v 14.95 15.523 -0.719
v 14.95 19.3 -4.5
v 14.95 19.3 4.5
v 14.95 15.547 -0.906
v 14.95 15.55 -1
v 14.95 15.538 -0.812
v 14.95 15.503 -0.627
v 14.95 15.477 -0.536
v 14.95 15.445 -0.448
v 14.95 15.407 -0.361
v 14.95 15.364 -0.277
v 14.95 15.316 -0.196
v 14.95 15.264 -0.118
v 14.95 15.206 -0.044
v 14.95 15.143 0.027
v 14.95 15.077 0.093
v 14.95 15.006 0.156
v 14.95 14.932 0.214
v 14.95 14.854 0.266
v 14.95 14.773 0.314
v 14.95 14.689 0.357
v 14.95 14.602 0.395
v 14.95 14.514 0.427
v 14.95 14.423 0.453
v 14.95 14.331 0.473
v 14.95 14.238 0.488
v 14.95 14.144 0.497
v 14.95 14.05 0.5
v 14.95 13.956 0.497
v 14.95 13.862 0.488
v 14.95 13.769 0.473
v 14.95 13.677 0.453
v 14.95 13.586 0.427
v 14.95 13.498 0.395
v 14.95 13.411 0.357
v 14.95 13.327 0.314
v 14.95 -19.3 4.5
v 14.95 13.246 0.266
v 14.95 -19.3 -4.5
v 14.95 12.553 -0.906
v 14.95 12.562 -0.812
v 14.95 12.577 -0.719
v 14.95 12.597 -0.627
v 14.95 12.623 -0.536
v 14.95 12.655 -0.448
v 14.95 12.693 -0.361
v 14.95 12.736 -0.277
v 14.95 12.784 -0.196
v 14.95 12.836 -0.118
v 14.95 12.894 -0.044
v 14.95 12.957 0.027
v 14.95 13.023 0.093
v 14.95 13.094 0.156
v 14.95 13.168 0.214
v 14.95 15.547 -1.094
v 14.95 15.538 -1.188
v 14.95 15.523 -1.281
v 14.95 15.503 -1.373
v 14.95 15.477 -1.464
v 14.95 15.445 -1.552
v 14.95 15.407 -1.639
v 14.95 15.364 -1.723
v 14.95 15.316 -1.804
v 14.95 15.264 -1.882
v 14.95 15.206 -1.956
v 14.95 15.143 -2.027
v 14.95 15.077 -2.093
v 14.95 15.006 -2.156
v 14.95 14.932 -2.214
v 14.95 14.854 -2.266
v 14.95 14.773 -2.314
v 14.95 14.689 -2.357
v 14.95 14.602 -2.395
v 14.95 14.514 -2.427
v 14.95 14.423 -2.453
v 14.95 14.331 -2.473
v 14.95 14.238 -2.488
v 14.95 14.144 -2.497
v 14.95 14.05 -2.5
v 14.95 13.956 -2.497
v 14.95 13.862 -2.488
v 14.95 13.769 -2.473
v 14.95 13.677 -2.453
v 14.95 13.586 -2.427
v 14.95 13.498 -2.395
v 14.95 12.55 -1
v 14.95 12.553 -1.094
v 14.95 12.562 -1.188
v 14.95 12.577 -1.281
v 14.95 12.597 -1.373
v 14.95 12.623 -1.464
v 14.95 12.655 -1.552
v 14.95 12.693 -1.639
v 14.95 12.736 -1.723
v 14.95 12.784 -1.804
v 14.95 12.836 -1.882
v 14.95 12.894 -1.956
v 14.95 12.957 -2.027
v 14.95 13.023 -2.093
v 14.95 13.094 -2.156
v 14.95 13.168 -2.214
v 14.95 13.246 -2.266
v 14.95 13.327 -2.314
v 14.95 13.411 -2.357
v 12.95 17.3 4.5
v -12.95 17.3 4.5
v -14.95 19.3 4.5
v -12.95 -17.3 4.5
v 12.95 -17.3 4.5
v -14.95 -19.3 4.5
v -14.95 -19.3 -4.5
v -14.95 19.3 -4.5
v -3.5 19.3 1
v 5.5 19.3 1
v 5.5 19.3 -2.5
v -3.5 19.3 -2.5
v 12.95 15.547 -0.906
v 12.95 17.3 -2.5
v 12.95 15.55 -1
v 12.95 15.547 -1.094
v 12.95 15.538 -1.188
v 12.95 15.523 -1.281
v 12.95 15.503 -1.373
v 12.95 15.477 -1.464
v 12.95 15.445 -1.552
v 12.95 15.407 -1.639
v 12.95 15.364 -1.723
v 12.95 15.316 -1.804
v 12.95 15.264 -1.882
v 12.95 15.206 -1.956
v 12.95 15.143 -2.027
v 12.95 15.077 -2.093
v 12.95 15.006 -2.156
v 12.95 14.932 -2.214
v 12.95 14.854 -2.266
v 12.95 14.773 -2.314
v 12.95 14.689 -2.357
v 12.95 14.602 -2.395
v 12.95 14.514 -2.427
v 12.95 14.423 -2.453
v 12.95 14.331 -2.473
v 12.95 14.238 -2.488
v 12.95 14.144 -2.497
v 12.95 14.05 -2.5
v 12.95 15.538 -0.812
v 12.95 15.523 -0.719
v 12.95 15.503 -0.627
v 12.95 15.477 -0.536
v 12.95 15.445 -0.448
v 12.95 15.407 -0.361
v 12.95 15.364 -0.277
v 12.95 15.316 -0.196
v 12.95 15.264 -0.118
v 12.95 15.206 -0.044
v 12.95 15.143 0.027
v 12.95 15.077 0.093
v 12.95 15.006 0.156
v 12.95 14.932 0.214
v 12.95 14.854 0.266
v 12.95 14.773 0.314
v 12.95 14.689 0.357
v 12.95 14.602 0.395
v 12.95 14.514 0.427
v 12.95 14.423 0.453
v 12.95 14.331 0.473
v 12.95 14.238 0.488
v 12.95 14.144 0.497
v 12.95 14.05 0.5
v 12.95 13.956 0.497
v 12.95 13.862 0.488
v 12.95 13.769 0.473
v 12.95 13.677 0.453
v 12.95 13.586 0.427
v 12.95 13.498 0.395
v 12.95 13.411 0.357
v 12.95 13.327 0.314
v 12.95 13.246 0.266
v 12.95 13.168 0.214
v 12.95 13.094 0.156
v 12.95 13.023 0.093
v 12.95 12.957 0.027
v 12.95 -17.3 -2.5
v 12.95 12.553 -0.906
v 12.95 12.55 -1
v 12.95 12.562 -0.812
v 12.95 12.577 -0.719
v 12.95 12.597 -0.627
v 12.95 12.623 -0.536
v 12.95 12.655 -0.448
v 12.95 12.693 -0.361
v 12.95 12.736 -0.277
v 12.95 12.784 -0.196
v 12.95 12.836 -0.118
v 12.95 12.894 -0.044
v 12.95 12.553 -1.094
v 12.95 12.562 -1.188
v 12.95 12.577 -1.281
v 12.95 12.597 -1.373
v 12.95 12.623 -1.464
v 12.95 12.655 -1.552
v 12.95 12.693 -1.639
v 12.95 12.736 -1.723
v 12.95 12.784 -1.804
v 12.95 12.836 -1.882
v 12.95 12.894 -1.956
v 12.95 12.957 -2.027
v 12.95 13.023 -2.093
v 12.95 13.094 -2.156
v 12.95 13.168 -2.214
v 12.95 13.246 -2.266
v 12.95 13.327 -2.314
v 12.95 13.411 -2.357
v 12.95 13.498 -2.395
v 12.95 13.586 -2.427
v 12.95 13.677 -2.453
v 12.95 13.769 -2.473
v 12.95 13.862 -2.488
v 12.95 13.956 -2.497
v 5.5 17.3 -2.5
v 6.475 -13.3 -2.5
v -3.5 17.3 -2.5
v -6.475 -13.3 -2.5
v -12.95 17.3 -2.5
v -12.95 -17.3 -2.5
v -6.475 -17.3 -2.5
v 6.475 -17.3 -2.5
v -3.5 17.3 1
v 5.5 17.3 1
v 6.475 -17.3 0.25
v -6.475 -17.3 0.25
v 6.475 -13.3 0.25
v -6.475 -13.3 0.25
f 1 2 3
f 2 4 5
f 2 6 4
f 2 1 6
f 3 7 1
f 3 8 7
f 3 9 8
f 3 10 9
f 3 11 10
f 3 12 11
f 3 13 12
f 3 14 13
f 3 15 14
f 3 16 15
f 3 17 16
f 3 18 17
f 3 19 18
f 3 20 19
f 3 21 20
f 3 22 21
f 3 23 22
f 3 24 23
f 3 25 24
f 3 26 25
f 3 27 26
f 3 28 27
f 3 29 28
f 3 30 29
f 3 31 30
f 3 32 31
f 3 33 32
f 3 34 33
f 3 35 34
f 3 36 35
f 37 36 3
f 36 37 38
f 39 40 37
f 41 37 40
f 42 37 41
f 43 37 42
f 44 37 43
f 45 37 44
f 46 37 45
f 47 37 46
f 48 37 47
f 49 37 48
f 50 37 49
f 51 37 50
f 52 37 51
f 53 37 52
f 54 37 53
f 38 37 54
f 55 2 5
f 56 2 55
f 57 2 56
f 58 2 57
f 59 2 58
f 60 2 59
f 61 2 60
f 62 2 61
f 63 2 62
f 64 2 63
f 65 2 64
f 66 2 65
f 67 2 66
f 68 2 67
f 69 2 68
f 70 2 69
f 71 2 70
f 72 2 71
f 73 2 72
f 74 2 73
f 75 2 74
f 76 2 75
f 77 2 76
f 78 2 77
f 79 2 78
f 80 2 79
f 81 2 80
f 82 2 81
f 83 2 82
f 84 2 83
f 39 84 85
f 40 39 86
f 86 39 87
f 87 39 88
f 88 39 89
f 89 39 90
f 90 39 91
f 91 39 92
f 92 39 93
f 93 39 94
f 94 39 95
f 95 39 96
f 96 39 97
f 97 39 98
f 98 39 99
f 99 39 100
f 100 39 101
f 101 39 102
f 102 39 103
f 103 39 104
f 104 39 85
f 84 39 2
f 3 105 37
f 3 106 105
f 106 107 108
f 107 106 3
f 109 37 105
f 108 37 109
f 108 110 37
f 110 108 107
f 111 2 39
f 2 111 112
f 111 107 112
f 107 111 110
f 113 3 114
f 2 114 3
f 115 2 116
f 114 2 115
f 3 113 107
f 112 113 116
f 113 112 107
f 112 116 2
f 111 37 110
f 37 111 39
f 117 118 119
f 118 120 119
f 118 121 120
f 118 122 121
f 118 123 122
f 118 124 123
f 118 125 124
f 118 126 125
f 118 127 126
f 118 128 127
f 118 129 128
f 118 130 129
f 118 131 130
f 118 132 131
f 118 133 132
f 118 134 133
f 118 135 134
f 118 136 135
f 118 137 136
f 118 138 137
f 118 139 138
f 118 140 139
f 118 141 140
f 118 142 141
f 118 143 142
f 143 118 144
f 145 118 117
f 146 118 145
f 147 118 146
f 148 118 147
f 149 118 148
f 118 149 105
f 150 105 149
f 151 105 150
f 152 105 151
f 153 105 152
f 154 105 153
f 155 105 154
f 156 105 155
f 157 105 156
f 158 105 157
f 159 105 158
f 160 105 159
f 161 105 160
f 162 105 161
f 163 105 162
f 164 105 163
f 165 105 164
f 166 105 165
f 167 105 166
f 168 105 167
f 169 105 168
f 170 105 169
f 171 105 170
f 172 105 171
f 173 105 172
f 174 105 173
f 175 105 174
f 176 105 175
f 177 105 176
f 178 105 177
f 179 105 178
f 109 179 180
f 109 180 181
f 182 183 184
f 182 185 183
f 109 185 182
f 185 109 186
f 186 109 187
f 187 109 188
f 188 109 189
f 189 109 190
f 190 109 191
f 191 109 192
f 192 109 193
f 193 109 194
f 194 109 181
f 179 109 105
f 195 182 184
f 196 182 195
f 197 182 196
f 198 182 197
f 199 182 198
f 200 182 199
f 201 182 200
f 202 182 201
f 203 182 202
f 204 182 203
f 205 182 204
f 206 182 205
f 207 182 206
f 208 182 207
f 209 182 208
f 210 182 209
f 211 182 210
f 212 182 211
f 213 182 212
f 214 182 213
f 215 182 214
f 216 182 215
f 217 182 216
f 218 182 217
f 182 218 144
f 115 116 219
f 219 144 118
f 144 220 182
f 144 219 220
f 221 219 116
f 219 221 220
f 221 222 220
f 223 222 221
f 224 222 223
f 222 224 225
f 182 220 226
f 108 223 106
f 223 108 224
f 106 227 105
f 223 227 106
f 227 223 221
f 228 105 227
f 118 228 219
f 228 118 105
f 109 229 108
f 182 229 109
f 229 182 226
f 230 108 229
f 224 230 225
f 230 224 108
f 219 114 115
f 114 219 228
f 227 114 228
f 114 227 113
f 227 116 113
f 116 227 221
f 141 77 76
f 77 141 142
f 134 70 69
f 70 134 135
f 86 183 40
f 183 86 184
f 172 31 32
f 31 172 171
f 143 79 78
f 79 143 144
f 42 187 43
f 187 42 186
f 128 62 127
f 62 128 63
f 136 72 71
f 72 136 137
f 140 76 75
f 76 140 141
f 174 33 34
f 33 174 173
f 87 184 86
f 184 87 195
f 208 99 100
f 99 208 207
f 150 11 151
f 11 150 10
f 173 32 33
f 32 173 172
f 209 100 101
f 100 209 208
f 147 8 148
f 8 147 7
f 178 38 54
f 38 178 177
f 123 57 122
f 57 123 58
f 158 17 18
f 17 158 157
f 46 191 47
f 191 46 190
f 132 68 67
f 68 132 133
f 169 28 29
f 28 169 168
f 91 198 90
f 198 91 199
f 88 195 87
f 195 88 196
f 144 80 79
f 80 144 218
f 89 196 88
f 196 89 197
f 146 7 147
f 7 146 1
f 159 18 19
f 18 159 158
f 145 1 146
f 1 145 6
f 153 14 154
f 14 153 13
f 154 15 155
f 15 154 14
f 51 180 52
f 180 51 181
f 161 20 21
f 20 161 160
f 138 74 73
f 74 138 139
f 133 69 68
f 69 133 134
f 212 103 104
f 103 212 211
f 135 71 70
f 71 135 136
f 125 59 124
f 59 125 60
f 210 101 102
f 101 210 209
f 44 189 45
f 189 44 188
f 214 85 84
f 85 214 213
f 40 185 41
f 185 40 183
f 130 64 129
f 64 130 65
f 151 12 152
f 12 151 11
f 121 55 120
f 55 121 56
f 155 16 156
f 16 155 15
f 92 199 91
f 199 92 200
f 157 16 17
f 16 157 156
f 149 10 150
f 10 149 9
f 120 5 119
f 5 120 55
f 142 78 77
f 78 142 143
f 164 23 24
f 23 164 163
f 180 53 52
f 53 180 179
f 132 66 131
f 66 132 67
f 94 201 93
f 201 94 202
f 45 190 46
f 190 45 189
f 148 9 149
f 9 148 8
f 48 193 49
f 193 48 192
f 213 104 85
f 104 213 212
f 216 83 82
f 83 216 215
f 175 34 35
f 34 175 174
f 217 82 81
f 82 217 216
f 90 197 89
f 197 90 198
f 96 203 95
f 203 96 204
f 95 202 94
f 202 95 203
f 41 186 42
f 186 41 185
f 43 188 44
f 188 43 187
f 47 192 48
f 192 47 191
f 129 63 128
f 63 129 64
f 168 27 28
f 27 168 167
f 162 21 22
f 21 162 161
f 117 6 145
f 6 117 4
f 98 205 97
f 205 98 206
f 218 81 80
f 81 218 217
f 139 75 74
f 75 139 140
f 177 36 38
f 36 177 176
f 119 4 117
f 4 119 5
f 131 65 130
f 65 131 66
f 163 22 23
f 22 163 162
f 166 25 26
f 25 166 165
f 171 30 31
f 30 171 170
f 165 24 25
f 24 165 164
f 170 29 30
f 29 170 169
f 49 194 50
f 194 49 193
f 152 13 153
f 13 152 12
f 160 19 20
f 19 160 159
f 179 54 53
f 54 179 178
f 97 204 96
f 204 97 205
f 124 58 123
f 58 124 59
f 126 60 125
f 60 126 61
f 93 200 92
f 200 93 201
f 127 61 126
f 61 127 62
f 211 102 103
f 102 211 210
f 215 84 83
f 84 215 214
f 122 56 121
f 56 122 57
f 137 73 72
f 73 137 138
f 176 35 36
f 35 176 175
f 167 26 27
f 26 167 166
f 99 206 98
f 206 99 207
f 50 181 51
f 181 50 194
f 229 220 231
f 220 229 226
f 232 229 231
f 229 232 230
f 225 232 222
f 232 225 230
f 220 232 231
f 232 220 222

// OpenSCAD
$fn = 100;

/*

This case is designed for a Wemos D1 Mini clone with a DS18B20 shield.

Original items:

* Wemos D1 Mini clone: https://www.ebay.co.uk/itm/363891216533
* DS18B20 shield: https://www.ebay.co.uk/itm/313603433601

*/

pcb_length = 34.6;
pcb_width = 25.9;
pcb_height = 7; //17.1; // height from bottom of USB socket to top board, excluding sensor poking out top

usb_socket_width = 9;
usb_socket_height = 3.5;
usb_socket_offset = 1;

pcb_lip_height = usb_socket_height;
pcb_lip_depth = 4;

sensor_diameter = 5;
case_wall_thickness = 2;

reset_hole_diameter = 3;
reset_hole_offset = 4.5; // distance from edge
// Build crude case

module crude_case() {
    difference() {
        cube([pcb_width + (2*case_wall_thickness), pcb_length + (2*case_wall_thickness), pcb_height + (case_wall_thickness)], center=true);
        translate([0,0,case_wall_thickness/2])
        cube([pcb_width, pcb_length, pcb_height], center=true);
    }
}

// usb hole
module usb_hole() {
    translate([usb_socket_offset, (pcb_length + case_wall_thickness)/2, -(pcb_height/2) + (usb_socket_height/2) + (case_wall_thickness/2)]) cube([usb_socket_width, case_wall_thickness, usb_socket_height], center = true);
}

// reset hole

module reset_hole() {
    translate([((pcb_width+case_wall_thickness)/2), pcb_length/2 - case_wall_thickness/2 - reset_hole_offset/2,-(pcb_height/2) + case_wall_thickness/2 + reset_hole_diameter/2]) rotate([0,90,0]) cylinder(h = case_wall_thickness, d = reset_hole_diameter, center = true);
}

// pcb lip

module pcb_lip() {
    translate([0,-pcb_length/2 + case_wall_thickness,-pcb_height/2 + case_wall_thickness]) cube([pcb_width/2, pcb_lip_depth, pcb_lip_height], center = true);
}

// combine

difference() {
    crude_case();
    usb_hole();
    reset_hole();
}

pcb_lip();
